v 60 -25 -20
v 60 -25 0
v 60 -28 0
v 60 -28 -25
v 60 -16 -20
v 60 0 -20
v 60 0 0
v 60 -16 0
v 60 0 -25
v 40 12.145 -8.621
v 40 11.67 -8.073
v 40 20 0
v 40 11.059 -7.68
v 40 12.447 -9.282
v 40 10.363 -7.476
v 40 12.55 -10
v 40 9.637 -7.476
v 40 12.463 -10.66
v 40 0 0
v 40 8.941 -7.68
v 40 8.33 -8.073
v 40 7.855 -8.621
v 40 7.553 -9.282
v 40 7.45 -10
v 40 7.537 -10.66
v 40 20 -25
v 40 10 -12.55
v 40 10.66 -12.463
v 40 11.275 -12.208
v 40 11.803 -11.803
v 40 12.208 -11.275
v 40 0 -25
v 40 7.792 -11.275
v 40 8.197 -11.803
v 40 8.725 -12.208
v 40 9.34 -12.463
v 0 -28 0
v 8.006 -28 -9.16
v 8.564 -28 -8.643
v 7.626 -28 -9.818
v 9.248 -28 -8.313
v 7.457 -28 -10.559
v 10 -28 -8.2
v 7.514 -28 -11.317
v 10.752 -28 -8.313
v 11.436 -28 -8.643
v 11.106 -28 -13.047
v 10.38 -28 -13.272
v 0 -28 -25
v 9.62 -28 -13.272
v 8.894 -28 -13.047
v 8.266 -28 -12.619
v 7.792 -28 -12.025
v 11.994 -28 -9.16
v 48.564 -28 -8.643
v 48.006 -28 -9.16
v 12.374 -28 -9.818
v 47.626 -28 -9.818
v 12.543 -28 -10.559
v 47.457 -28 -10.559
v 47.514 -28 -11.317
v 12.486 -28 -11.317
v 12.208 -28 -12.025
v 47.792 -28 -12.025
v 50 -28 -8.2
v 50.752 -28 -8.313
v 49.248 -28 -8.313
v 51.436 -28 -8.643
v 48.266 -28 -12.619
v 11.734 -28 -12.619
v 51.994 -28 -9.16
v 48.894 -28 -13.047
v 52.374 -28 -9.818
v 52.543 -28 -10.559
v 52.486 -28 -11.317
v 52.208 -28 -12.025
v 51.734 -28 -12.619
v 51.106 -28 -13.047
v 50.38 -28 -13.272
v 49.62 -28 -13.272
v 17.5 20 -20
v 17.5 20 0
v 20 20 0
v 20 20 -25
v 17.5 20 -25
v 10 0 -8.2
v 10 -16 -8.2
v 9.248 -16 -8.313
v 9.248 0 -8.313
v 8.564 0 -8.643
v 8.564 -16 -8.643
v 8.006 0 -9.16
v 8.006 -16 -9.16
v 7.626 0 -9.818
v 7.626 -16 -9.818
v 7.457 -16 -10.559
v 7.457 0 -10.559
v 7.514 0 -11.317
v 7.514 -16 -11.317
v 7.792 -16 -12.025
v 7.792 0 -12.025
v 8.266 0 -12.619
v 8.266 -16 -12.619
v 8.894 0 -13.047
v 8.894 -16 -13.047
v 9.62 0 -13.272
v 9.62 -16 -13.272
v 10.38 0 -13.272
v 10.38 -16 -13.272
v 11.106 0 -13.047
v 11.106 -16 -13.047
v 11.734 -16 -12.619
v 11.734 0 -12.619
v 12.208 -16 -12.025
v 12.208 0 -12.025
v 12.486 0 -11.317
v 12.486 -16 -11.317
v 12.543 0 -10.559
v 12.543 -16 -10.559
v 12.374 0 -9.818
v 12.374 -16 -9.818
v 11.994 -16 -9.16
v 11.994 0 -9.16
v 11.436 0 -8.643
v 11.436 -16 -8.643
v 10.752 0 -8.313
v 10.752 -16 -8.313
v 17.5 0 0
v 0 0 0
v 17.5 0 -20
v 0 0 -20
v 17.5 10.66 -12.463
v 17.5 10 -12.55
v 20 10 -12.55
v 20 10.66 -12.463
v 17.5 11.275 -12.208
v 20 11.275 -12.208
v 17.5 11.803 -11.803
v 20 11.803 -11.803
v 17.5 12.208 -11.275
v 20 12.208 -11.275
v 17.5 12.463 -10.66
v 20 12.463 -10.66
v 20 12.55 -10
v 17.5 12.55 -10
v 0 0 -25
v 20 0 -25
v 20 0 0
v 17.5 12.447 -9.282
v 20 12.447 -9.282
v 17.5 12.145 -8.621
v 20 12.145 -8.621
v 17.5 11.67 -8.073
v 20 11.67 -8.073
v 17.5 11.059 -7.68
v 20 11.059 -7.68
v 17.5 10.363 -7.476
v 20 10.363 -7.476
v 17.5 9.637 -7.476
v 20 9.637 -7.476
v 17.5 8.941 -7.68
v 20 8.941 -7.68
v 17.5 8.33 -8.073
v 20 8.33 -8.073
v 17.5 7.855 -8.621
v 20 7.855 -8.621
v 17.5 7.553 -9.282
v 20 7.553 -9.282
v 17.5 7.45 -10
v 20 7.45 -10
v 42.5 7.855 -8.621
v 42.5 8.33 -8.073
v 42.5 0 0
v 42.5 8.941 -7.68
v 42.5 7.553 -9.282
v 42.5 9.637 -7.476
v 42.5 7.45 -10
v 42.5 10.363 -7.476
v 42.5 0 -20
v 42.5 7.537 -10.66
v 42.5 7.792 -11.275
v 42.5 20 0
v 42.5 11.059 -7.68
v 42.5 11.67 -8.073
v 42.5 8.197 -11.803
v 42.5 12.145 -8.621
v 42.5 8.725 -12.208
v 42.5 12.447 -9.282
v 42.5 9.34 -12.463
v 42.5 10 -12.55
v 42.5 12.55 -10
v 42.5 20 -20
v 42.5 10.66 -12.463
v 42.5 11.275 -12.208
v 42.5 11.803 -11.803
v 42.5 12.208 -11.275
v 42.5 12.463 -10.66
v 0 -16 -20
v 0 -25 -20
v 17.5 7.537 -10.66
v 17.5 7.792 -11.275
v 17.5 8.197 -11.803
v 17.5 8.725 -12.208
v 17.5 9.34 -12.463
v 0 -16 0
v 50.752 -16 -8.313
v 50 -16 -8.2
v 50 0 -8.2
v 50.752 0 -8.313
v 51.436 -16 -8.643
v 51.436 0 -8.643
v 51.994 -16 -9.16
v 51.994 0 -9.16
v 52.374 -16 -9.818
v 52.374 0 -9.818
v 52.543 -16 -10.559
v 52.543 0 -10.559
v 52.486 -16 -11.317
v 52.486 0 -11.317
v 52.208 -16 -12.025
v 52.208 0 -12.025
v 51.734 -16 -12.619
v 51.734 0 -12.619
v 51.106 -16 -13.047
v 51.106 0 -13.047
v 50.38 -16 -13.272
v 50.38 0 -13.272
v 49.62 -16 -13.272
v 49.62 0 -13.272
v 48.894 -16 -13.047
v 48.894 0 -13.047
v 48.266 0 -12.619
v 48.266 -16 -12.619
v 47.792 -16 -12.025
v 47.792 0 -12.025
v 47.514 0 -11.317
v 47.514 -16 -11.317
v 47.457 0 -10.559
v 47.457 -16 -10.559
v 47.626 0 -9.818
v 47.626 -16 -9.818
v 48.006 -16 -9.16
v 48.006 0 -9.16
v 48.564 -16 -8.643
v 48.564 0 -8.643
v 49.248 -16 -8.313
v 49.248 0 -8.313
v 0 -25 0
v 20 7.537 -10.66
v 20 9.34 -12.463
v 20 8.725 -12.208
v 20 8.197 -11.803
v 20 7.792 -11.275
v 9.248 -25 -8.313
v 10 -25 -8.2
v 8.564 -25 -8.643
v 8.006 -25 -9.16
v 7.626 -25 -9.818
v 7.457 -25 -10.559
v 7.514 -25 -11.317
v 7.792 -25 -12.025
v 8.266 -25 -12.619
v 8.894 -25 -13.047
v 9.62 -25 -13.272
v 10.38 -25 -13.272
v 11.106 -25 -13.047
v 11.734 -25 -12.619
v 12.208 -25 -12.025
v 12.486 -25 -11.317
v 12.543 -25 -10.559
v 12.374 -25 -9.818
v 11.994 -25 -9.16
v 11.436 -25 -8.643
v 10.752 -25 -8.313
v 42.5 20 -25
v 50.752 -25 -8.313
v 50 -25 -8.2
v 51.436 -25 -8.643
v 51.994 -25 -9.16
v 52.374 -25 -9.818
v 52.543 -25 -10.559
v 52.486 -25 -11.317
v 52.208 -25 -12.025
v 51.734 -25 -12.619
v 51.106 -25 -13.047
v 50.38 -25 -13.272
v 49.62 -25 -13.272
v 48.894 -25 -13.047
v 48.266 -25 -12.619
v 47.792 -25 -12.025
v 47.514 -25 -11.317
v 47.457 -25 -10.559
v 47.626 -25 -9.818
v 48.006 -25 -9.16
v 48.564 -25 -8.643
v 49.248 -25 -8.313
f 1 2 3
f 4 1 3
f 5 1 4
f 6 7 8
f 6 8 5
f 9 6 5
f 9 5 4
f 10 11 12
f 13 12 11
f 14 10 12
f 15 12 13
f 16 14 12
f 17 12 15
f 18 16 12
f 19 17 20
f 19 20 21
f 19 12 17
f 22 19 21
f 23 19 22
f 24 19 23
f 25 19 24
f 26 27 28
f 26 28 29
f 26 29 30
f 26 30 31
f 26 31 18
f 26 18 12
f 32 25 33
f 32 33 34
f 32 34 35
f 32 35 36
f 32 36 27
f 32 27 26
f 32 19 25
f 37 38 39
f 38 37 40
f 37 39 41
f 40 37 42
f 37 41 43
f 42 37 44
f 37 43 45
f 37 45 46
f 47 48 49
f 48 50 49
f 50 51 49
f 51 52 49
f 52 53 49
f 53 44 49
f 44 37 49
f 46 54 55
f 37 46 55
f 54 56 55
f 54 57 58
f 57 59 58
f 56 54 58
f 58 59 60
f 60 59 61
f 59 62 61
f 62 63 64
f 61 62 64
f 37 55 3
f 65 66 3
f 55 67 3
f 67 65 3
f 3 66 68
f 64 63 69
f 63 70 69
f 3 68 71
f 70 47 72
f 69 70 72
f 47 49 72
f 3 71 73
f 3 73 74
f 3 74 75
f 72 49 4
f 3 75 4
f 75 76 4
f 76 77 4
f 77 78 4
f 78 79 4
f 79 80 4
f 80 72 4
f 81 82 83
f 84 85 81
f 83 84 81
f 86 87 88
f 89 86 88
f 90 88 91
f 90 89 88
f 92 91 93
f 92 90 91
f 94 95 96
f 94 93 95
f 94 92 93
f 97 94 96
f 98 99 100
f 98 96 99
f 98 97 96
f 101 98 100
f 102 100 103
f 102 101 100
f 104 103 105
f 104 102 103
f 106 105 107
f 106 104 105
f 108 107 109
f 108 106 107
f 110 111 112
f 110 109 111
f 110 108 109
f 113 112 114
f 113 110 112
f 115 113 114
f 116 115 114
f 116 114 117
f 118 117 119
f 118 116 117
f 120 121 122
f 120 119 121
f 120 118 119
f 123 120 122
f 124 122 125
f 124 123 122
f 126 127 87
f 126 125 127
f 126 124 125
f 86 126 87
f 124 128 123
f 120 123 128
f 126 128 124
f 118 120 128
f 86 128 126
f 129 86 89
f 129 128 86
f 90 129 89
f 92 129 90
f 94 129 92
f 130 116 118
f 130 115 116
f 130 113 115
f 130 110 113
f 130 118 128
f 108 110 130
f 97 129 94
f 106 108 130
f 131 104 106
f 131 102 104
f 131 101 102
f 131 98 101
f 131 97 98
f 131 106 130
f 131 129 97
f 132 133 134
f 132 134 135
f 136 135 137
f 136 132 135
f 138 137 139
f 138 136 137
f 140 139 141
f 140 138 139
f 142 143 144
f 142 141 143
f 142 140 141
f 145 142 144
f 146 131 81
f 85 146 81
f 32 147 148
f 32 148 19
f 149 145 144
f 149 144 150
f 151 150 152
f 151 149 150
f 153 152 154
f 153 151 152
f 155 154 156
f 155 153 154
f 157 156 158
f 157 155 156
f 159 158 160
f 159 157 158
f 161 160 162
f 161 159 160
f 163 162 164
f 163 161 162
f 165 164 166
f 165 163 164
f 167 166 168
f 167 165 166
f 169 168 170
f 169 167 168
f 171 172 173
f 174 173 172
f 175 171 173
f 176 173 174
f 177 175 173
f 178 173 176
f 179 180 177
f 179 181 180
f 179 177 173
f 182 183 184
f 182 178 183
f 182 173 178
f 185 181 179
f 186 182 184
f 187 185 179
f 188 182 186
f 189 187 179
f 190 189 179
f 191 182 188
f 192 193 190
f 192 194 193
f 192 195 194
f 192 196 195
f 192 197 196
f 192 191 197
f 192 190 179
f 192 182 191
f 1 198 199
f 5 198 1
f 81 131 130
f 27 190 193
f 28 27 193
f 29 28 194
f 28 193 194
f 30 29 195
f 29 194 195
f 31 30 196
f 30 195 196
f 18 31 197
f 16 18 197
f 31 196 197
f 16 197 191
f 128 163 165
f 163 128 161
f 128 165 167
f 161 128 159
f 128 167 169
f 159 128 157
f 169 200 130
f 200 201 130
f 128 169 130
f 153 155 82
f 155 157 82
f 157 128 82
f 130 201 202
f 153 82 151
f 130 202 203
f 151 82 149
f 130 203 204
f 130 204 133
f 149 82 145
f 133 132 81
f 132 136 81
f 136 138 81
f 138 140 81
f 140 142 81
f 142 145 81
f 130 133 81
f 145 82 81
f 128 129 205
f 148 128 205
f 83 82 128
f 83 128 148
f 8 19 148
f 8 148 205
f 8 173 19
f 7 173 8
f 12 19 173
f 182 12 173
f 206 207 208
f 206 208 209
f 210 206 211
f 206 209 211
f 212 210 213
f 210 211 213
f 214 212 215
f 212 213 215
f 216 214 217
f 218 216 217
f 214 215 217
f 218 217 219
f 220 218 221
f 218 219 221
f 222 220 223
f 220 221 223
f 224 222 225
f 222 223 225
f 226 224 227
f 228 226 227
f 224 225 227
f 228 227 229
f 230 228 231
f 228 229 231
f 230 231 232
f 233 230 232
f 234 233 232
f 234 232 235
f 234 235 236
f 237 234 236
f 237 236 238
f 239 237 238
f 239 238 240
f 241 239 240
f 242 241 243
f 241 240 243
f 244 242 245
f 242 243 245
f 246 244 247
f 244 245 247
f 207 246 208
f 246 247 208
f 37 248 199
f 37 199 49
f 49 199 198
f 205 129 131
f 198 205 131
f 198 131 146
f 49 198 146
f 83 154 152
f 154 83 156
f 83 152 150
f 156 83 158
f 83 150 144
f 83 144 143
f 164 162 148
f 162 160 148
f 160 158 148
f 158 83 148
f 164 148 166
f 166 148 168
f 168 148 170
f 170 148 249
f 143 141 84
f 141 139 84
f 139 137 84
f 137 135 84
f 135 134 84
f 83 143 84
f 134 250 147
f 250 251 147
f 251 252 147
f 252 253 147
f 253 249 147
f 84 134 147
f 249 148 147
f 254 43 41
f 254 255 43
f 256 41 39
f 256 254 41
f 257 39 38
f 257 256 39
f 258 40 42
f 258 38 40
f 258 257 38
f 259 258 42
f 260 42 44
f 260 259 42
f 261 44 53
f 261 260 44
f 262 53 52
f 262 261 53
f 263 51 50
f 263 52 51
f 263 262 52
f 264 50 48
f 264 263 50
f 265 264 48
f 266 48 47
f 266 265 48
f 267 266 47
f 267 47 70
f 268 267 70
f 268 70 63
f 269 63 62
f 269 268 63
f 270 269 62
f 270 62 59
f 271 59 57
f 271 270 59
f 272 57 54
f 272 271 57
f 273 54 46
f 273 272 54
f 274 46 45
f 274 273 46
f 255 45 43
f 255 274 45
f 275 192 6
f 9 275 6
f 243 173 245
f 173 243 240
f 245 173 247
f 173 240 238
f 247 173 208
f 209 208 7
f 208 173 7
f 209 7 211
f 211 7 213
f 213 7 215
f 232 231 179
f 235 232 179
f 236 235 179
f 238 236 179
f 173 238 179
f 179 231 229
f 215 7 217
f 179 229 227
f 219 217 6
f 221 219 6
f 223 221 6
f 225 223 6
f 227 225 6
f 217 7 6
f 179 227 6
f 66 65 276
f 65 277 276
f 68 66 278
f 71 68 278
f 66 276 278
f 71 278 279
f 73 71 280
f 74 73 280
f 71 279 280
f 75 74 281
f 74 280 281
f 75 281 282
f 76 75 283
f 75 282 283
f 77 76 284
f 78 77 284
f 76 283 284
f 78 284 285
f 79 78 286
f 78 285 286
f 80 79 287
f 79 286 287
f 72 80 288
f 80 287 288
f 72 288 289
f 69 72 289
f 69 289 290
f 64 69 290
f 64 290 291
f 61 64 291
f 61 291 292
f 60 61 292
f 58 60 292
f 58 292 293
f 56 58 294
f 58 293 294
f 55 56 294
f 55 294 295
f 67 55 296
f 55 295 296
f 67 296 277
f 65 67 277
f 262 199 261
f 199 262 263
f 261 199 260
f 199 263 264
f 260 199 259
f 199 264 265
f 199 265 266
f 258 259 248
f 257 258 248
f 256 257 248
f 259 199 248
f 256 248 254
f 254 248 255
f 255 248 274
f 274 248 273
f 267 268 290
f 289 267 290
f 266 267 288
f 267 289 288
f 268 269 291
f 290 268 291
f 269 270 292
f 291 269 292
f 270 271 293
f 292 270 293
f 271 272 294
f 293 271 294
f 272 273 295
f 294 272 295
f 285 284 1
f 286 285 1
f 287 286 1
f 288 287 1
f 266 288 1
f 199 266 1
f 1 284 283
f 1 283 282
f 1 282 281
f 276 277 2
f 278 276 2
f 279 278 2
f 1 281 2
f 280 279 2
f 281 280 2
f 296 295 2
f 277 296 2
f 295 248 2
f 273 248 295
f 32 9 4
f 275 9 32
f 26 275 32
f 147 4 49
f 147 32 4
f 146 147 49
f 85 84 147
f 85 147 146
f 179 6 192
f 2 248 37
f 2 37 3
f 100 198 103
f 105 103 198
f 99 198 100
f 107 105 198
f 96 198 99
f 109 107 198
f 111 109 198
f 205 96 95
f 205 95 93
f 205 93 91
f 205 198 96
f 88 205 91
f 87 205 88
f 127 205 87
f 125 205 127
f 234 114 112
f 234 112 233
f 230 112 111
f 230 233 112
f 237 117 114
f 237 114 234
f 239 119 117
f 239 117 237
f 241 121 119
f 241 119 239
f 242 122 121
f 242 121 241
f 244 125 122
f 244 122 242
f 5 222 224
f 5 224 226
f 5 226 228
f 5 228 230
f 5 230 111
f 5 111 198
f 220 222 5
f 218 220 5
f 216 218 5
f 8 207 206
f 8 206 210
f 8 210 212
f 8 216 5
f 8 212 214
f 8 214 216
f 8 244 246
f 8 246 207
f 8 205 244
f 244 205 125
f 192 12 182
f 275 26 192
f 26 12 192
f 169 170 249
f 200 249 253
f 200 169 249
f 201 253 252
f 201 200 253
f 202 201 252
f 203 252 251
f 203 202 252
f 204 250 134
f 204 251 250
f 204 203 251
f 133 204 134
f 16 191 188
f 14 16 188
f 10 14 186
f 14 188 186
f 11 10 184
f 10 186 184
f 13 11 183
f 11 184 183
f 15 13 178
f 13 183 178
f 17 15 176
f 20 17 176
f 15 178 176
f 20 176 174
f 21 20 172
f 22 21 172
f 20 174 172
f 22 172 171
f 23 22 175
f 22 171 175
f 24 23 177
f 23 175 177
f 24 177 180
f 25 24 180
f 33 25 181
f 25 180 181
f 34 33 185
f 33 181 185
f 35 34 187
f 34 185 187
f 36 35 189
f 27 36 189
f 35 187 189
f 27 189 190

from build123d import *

# Parameters (mm, degrees)
SKETCH1_W             = 20
SKETCH1_H             = 25
BOSS_EXTRUDE1_DEPTH   = 20
BOSS_EXTRUDE1_2_DEPTH = 20
SKETCH1_3_W           = 20
SKETCH1_3_H           = 25
BOSS_EXTRUDE2_DEPTH   = 28
SKETCH2_W             = 60
SKETCH2_H             = 9
CUT_EXTRUDE1_DEPTH    = 20
CUT_EXTRUDE2_DEPTH    = 71.774289117
SKETCH4_W             = 15
SKETCH4_H             = 20
SKETCH4_W_2           = 5
CUT_EXTRUDE3_DEPTH    = 17.5
CUT_EXTRUDE5_DEPTH    = 22.5
SKETCH7_R             = 2.55
CUT_EXTRUDE6_DEPTH    = 71.774289117


with BuildPart() as part:
    # Sketch1 → Boss-Extrude1 (new body)
    with BuildSketch(Plane(origin=(0, 0, 0), x_dir=(1, 0, 0), z_dir=(0, 1, 0))):
        with Locations((10, 12.5)):
            Rectangle(SKETCH1_W, SKETCH1_H)
    extrude(amount=BOSS_EXTRUDE1_DEPTH)



with BuildPart() as body_2:
    # Sketch1 → Boss-Extrude1 2 (new body)
    with BuildSketch(Plane(origin=(0, 0, 0), x_dir=(1, 0, 0), z_dir=(0, 1, 0))):
        with Locations((50, 12.5)):
            Rectangle(SKETCH1_W, SKETCH1_H)
    extrude(amount=BOSS_EXTRUDE1_2_DEPTH)


with BuildPart() as part_1:
    add(part.part)

    add(body_2.part)  # Boss-Extrude2 merges body 2
    # Sketch1<3> → Boss-Extrude2 (add)
    with BuildSketch(Plane(origin=(0, 0, 0), x_dir=(1, 0, 0), z_dir=(0, 1, 0))):
        with Locations((30, 12.5)):
            Rectangle(SKETCH1_3_W, SKETCH1_3_H)
        with Locations((10, 12.5)):
            Rectangle(SKETCH1_3_W, SKETCH1_3_H)
        with Locations((50, 12.5)):
            Rectangle(SKETCH1_3_W, SKETCH1_3_H)
    extrude(amount=-BOSS_EXTRUDE2_DEPTH)

    # Sketch2 → Cut-Extrude1 (cut)
    with BuildSketch(Plane.XY):
        with Locations((30, -20.5)):
            Rectangle(SKETCH2_W, SKETCH2_H)
    extrude(amount=-CUT_EXTRUDE1_DEPTH, mode=Mode.SUBTRACT)

    # Sketch3 → Cut-Extrude2 (cut, through all)
    with BuildSketch(Plane.XY):
        Polygon((0, 20), (0, 0), (17.5, 20), align=None)
        Polygon((42.5, 20), (60, 0), (60, 20), align=None)
    extrude(amount=-CUT_EXTRUDE2_DEPTH, mode=Mode.SUBTRACT)

    # Sketch4 → Cut-Extrude3 (cut)
    with BuildSketch(Plane(origin=(60, 0, 0), x_dir=(0, 0, -1), z_dir=(1, 0, 0))):
        with Locations((12.5, 10)):
            Rectangle(SKETCH4_W, SKETCH4_H)
        with Locations((2.5, 10)):
            Rectangle(SKETCH4_W_2, SKETCH4_H)
    cut_extrude3 = extrude(amount=-CUT_EXTRUDE3_DEPTH, mode=Mode.SUBTRACT)

    # Sketch5 → Cut-Extrude5 (cut)
    with BuildSketch(Plane(origin=(42.5, 0, 0), x_dir=(0, 0, -1), z_dir=(1, 0, 0))):
        with BuildLine():
            ThreePointArc((12.55, 10), (11.803122292, 11.803122292), (10, 12.55))
            Line((10, 12.55), (10, 7.45))
            ThreePointArc((10, 7.45), (11.803122292, 8.196877708), (12.55, 10))
        make_face()
        with BuildLine():
            Line((10, 7.45), (10, 12.55))
            ThreePointArc((10, 12.55), (7.45, 10), (10, 7.45))
        make_face()
    cut_extrude5 = extrude(amount=-CUT_EXTRUDE5_DEPTH, mode=Mode.SUBTRACT)

    # Sketch7 → Cut-Extrude6 (cut, symmetric)
    with BuildSketch(Plane(origin=(0, 0, 0), x_dir=(1, 0, 0), z_dir=(0, 1, 0))):
        with Locations(Location((50, 10.75, 0), (0, 0, 270))):
            Circle(SKETCH7_R)
    cut_extrude6 = extrude(amount=CUT_EXTRUDE6_DEPTH, both=True, mode=Mode.SUBTRACT)

    # Mirror3: Cut-Extrude3, Cut-Extrude5, Cut-Extrude6 across plane
    add(cut_extrude3.mirror(Plane.ZY.offset(-30)), mode=Mode.SUBTRACT)
    add(cut_extrude5.mirror(Plane.ZY.offset(-30)), mode=Mode.SUBTRACT)
    add(cut_extrude6.mirror(Plane.ZY.offset(-30)), mode=Mode.SUBTRACT)


solid = part_1.part
